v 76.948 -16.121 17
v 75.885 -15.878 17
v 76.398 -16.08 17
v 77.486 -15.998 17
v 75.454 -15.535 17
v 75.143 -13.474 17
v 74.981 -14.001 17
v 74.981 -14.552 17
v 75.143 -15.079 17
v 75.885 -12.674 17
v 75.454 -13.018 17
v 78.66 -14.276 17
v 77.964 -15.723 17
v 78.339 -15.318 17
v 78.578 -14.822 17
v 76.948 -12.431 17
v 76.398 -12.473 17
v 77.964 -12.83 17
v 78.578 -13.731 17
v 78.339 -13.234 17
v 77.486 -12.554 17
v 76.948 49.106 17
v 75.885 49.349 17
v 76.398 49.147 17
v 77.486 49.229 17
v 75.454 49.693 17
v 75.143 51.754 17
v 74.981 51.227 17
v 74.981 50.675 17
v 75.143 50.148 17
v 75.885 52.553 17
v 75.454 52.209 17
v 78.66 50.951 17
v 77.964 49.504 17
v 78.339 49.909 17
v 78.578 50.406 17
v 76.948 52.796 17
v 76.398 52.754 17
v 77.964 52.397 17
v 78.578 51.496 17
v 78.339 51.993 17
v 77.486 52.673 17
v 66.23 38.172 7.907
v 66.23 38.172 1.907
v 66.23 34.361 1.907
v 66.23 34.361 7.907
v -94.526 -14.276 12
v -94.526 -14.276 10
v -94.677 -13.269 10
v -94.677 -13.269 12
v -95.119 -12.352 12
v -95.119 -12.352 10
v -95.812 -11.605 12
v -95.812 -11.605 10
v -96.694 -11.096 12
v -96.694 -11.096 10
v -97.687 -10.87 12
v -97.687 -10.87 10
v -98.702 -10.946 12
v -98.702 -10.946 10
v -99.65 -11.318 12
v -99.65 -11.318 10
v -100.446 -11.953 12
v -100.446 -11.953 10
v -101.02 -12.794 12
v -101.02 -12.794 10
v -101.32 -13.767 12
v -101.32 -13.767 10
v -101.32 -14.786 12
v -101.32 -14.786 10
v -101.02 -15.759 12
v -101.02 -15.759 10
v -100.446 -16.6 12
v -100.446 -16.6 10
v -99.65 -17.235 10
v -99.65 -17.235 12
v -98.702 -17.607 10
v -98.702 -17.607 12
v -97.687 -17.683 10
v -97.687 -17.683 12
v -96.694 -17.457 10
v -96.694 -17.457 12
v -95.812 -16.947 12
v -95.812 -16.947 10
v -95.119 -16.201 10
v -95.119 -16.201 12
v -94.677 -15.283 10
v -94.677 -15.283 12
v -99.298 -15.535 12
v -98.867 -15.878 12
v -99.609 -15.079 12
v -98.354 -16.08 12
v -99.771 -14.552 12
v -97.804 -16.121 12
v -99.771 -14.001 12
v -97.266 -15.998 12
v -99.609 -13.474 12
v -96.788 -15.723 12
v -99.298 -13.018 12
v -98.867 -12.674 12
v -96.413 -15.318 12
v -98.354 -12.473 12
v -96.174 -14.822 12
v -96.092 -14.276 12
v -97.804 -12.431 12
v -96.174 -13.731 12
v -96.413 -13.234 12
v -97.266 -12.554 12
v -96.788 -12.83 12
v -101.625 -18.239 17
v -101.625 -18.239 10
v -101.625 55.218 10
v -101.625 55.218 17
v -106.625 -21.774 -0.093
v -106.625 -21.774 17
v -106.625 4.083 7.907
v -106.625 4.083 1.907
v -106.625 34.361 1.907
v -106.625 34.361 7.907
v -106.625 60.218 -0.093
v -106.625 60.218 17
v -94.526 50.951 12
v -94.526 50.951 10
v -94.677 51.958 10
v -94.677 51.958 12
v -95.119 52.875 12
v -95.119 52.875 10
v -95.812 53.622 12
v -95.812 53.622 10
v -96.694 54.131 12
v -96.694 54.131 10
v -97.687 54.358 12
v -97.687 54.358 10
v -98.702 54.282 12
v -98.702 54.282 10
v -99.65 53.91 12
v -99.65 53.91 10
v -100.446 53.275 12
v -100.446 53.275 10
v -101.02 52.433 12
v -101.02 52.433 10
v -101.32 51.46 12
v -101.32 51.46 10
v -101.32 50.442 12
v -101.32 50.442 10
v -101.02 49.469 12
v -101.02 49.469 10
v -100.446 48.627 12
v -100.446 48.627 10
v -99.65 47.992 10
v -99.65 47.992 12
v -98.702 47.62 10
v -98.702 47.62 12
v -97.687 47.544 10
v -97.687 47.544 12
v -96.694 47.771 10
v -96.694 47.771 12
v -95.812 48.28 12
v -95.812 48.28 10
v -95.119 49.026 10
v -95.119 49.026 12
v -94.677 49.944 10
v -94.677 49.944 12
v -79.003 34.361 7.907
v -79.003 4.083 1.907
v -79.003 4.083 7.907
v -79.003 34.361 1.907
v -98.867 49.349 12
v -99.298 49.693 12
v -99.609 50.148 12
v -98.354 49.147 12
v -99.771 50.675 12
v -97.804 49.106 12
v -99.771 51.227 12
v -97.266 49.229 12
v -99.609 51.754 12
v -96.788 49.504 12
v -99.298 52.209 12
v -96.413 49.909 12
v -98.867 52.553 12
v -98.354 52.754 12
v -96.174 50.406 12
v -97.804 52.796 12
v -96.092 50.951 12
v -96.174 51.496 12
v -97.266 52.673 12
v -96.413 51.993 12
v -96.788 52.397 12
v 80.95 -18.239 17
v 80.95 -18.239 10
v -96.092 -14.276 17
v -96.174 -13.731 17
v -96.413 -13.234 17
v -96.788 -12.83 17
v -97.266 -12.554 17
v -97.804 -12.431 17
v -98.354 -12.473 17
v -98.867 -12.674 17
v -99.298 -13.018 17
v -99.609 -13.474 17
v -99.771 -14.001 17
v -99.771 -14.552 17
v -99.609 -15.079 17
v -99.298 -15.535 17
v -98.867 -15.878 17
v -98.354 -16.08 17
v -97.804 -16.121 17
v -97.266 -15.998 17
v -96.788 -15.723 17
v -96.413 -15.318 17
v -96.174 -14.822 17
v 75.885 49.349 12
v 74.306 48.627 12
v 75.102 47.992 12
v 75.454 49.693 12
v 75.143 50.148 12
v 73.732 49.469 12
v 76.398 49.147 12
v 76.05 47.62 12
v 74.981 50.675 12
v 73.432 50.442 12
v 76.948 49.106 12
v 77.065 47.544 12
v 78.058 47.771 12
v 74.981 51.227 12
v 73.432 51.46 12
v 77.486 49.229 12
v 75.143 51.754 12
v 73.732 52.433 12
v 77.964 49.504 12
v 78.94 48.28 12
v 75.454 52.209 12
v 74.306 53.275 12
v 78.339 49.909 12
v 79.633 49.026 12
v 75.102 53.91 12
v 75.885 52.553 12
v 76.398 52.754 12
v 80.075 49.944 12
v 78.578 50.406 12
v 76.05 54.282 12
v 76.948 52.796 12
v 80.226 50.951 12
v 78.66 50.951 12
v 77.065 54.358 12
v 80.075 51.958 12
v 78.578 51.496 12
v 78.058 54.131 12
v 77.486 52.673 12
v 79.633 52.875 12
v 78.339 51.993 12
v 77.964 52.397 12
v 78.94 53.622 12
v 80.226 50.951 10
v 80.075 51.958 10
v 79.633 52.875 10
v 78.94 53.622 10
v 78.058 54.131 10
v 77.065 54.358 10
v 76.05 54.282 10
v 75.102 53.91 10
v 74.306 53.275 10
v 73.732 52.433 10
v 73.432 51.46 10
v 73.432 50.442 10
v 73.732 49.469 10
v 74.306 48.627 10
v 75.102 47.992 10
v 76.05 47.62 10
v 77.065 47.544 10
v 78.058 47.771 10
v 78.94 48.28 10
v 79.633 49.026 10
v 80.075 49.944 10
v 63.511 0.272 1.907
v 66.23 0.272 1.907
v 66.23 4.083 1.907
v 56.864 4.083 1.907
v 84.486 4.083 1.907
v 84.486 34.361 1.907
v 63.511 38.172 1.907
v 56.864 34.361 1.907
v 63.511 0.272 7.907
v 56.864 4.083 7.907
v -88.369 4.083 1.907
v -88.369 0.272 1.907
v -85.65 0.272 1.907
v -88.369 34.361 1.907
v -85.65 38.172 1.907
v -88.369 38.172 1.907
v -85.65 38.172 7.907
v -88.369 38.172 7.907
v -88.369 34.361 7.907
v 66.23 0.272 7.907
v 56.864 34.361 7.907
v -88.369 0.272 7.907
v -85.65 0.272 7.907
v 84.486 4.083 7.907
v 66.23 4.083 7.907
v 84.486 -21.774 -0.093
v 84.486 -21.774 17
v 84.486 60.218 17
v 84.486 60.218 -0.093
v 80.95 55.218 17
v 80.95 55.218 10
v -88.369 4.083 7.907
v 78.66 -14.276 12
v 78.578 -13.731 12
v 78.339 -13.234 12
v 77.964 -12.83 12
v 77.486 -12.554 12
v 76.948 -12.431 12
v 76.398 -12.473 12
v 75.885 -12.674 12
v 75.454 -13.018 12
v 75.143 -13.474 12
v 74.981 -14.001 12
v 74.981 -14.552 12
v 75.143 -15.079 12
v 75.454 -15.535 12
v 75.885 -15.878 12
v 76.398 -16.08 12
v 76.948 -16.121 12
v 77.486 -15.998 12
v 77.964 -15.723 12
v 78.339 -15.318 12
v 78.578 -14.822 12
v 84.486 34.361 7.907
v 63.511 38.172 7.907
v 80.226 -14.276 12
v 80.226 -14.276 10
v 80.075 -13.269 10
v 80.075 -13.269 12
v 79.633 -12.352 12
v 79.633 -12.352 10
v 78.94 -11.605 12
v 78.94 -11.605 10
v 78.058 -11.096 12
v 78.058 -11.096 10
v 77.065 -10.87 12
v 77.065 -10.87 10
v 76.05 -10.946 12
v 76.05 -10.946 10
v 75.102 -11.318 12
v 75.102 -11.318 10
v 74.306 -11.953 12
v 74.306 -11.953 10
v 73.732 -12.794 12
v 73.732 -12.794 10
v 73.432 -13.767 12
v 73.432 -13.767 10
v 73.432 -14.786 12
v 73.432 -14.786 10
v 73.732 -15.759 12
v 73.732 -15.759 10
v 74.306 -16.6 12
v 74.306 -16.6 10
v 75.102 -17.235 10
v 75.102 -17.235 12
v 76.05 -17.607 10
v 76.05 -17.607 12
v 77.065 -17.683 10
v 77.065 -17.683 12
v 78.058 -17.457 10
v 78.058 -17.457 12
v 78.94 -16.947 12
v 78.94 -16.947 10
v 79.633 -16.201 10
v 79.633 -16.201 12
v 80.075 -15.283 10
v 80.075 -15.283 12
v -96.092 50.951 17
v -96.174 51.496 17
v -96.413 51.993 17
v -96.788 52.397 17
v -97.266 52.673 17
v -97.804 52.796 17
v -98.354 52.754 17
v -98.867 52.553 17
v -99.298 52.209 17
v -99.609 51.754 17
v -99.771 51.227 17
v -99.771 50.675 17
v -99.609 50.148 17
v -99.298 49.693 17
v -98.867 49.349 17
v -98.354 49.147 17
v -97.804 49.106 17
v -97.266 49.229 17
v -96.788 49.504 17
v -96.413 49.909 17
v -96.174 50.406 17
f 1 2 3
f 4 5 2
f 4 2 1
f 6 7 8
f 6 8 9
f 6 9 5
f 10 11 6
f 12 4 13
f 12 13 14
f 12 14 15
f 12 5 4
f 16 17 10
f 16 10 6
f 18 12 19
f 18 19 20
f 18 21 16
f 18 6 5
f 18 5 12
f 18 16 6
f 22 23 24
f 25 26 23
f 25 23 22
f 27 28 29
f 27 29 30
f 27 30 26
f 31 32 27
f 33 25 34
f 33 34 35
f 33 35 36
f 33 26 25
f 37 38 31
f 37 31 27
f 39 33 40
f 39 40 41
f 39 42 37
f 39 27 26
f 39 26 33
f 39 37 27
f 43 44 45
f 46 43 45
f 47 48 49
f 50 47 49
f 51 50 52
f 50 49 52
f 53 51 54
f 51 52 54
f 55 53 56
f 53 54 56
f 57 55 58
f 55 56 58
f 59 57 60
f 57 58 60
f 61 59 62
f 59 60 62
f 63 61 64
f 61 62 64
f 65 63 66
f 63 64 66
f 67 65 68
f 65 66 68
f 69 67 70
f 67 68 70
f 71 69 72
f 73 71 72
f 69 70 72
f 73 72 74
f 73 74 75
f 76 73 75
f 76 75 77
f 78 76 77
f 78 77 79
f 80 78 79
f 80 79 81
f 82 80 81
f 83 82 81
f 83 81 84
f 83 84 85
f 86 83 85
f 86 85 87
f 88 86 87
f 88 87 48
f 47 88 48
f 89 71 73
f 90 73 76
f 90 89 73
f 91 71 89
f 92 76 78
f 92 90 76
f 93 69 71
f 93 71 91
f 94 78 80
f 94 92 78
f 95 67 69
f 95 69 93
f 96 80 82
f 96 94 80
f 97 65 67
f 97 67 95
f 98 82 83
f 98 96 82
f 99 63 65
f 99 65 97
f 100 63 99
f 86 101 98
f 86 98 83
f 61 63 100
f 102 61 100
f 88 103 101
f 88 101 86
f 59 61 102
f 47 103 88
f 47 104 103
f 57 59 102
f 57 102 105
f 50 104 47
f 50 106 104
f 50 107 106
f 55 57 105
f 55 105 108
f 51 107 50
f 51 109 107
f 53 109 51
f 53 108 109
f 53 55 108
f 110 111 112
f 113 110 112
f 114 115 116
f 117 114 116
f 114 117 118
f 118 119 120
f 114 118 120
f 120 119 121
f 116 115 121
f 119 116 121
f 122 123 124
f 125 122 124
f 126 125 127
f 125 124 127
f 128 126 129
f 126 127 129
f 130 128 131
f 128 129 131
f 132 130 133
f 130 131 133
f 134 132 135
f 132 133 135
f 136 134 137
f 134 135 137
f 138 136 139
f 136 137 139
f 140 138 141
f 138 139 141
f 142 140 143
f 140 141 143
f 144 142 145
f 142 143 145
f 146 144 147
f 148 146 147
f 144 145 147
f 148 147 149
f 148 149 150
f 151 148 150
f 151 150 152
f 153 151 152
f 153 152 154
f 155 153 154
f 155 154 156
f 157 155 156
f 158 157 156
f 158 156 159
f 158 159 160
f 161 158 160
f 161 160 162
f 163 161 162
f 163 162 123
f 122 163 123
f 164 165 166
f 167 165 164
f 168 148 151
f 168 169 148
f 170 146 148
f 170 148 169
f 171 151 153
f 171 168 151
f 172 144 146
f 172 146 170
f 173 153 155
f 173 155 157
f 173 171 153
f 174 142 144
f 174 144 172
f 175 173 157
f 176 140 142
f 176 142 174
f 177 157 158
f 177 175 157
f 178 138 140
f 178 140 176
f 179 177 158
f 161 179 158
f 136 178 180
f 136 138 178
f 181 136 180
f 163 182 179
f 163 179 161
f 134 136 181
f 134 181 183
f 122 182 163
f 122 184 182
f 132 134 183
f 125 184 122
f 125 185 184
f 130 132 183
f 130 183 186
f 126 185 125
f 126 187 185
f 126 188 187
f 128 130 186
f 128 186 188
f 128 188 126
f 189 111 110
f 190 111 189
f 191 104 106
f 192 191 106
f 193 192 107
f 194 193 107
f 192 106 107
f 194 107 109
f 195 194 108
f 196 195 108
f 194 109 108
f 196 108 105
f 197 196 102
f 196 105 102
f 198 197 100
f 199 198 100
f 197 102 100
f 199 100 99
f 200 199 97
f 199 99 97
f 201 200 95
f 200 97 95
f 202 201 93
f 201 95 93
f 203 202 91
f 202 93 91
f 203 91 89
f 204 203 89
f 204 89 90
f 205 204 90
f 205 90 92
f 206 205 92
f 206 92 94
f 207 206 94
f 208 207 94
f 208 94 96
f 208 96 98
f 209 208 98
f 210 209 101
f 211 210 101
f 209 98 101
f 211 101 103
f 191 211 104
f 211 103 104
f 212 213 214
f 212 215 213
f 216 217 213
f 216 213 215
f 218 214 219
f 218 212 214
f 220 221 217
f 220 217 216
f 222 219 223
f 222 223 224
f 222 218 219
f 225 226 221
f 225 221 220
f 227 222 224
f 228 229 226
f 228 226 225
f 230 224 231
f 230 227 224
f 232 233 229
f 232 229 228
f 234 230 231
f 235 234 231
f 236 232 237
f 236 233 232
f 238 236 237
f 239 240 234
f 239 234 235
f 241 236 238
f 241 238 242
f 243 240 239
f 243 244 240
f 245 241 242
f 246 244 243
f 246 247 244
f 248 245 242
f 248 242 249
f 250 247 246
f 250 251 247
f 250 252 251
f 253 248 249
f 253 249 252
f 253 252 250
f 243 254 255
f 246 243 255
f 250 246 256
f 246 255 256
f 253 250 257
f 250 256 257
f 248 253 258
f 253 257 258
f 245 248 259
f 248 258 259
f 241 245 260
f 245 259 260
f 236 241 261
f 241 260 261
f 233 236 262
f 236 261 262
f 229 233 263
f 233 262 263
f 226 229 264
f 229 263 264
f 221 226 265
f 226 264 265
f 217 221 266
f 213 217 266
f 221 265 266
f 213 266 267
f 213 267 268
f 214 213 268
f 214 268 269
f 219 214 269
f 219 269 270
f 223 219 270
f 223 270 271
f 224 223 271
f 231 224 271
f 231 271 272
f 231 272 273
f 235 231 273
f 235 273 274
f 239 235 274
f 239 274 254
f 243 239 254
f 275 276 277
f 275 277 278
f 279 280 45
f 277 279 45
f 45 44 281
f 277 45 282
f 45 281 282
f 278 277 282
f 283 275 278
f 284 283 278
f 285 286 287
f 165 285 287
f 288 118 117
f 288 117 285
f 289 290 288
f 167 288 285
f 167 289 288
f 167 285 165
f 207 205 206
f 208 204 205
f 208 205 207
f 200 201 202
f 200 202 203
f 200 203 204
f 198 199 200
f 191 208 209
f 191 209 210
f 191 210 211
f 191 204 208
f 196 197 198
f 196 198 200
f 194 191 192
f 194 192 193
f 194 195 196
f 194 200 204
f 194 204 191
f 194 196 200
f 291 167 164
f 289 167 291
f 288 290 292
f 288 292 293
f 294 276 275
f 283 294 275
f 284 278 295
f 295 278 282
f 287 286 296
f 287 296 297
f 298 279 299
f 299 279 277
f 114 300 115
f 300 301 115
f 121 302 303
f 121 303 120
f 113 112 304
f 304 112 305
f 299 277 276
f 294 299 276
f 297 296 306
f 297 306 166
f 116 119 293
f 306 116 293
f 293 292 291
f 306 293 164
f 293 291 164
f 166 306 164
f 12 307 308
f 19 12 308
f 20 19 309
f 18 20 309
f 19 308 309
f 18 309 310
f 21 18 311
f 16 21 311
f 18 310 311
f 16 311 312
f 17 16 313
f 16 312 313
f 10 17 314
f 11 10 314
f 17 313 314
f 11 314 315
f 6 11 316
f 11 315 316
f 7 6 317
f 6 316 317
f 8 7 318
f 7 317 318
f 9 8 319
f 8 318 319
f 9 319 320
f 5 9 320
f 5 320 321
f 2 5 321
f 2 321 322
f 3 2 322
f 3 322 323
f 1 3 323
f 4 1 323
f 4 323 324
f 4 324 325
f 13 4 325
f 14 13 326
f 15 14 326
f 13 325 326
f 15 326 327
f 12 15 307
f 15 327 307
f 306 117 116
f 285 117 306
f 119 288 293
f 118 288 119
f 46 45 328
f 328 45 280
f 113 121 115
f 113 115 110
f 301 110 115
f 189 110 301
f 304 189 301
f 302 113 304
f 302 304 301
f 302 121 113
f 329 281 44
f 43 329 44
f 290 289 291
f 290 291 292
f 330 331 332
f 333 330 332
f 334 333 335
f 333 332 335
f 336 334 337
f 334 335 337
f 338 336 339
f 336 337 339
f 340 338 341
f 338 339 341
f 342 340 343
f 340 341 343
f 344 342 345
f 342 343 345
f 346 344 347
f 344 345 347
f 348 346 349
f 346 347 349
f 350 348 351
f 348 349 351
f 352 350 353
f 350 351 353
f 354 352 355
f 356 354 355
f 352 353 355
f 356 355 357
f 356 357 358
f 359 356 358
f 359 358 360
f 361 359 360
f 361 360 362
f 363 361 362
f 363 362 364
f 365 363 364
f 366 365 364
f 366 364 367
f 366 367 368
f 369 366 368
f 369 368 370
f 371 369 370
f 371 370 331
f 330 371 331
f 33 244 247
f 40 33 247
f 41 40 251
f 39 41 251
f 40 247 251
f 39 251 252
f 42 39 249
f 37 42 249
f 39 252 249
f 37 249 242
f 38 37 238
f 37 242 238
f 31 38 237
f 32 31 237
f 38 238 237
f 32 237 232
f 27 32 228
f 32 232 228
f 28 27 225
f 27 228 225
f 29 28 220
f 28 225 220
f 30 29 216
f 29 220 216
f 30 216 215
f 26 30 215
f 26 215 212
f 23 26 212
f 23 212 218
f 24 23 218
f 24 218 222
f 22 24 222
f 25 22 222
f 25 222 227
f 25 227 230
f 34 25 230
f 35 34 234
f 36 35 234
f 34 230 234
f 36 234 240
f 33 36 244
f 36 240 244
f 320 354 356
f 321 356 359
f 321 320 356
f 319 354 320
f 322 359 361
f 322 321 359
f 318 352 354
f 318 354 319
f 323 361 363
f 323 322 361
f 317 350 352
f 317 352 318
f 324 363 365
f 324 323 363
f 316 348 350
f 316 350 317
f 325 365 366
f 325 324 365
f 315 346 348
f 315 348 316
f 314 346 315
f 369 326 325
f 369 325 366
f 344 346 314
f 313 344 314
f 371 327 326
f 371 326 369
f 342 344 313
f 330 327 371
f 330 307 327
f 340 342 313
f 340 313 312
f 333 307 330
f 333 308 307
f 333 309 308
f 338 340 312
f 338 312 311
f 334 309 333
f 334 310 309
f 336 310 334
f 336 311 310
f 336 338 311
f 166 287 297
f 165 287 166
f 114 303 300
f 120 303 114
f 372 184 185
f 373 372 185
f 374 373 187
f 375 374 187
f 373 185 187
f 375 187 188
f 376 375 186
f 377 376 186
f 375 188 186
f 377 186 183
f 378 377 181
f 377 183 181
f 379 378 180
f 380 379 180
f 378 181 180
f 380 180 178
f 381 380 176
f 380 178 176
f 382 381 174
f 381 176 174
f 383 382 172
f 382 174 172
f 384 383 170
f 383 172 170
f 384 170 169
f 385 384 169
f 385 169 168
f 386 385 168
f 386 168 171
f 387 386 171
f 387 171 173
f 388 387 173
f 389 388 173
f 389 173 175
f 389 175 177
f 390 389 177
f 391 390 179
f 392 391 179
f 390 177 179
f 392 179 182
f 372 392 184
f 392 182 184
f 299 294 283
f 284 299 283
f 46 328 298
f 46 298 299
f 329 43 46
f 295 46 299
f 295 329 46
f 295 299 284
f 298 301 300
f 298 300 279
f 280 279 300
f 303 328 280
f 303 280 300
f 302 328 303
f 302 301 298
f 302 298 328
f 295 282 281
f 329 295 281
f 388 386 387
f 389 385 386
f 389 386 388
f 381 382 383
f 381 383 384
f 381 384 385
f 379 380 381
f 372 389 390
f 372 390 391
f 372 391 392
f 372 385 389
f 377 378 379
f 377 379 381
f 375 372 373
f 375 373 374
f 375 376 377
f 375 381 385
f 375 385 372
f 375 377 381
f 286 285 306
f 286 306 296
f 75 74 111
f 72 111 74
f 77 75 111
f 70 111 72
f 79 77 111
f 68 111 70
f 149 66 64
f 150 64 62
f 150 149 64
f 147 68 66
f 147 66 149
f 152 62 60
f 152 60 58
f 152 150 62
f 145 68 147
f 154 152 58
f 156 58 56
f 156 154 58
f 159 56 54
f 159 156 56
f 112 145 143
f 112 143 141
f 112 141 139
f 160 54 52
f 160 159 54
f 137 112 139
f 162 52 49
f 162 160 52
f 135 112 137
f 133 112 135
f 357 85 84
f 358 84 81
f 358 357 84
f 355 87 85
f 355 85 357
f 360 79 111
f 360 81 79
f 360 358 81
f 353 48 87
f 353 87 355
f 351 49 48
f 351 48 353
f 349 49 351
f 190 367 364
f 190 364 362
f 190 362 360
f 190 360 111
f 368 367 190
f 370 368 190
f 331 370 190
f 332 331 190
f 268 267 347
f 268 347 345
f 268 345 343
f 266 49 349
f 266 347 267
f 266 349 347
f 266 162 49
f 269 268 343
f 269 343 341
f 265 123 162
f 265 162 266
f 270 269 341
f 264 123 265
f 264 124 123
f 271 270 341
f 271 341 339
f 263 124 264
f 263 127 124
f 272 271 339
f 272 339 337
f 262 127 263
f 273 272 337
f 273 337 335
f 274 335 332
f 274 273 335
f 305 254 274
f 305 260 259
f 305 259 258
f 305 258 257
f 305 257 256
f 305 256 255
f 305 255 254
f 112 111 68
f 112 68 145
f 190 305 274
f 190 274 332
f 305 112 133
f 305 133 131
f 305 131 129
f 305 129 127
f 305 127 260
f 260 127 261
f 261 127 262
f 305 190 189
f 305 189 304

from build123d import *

# Parameters (mm, degrees)
BOSS_EXTRUDE1_DEPTH      = 5
BOSS_EXTRUDE1_DEPTH_BACK = 0.093151617
SKETCH1_W                = 182.5752
SKETCH1_H                = 73.4568
SKETCH2_R                = 3.416363386
BOSS_EXTRUDE2_DEPTH      = 7
SKETCH3_R                = 1.85
BOSS_EXTRUDE3_DEPTH      = 5
SKETCH4_W                = 191.110733906
SKETCH4_H                = 81.992333906
SKETCH4_W_2              = 182.5752
SKETCH4_H_2              = 73.4568
BOSS_EXTRUDE4_DEPTH      = 12
SKETCH5_W                = 191.110733906
SKETCH5_H                = 81.992333906
BOSS_EXTRUDE5_DEPTH      = 5.093151617
SKETCH7_W                = 182.5752
SKETCH7_H                = 73.4568
BOSS_EXTRUDE7_DEPTH      = 5
CUT_EXTRUDE1_START       = -2
CUT_EXTRUDE1_DEPTH       = 6


with BuildPart() as part:
    # Sketch1 → Boss-Extrude1 (new, two sides: drawn at the far end of the back side and taken through both)
    with BuildSketch(Plane.XY.offset(-BOSS_EXTRUDE1_DEPTH_BACK)):
        with Locations((-10.337299282, 18.489677755)):
            Rectangle(SKETCH1_W, SKETCH1_H)
    extrude(amount=BOSS_EXTRUDE1_DEPTH + BOSS_EXTRUDE1_DEPTH_BACK)

    # Sketch2 → Boss-Extrude2 (add)
    with BuildSketch(Plane.XY.offset(5)):
        with Locations((-97.941899282, 50.950877755)):
            Circle(SKETCH2_R)
        with Locations((76.810100718, 50.950877755)):
            Circle(SKETCH2_R)
        with Locations((76.810100718, -14.276322245)):
            Circle(SKETCH2_R)
        with Locations((-97.941899282, -14.276322245)):
            Circle(SKETCH2_R)
    extrude(amount=BOSS_EXTRUDE2_DEPTH)

    # Sketch3 → Boss-Extrude3 (add)
    with BuildSketch(Plane.XY.offset(12)):
        with Locations((-97.941899282, 50.950877755)):
            Circle(SKETCH3_R)
        with Locations((-97.941899282, -14.276322245)):
            Circle(SKETCH3_R)
        with Locations((76.810100718, -14.276322245)):
            Circle(SKETCH3_R)
        with Locations((76.810100718, 50.950877755)):
            Circle(SKETCH3_R)
    extrude(amount=BOSS_EXTRUDE3_DEPTH)



with BuildPart() as body_2:
    # Sketch4 → Boss-Extrude4 (new body)
    with BuildSketch(Plane.XY.offset(5)):
        with Locations((-11.069532329, 19.221910802)):
            Rectangle(SKETCH4_W, SKETCH4_H)
        with Locations((-10.337299282, 18.489677755)):
            Rectangle(SKETCH4_W_2, SKETCH4_H_2, mode=Mode.SUBTRACT)
    extrude(amount=BOSS_EXTRUDE4_DEPTH)


with BuildPart() as part_1:
    add(part.part)

    add(body_2.part)  # Boss-Extrude5 merges body 2
    # Sketch5 → Boss-Extrude5 (add)
    with BuildSketch(Plane(origin=(0, 0, 5), x_dir=(-1, 0, 0), z_dir=(0, 0, -1))):
        with Locations((11.069532329, 19.221910802)):
            Rectangle(SKETCH5_W, SKETCH5_H)
    extrude(amount=BOSS_EXTRUDE5_DEPTH)

    # Sketch7 → Boss-Extrude7 (add)
    with BuildSketch(Plane.XY.offset(5)):
        with Locations((-10.337299282, 18.489677755)):
            Rectangle(SKETCH7_W, SKETCH7_H)
    extrude(amount=BOSS_EXTRUDE7_DEPTH)

    # Sketch6 → Cut-Extrude1 (cut)
    with BuildSketch(Plane(origin=(0, 0, -0.093151617), x_dir=(-1, 0, 0), z_dir=(0, 0, -1)).offset(CUT_EXTRUDE1_START)):
        Polygon((-84.485834624, 34.360708249), (-84.485834624, 4.083113354), (-66.229962778, 4.083113354), (-66.229962778, 0.271521895), (-63.510633591, 0.271521895), (-56.864299396, 4.083113354), (-56.864299396, 34.360708249), (-63.510633591, 38.172299708), (-66.229962778, 38.172299708), (-66.229962778, 34.360708249), align=None)
    cut_extrude1 = extrude(amount=-CUT_EXTRUDE1_DEPTH, mode=Mode.SUBTRACT)

    # Mirror1: Cut-Extrude1 across plane
    add(cut_extrude1.mirror(Plane(origin=(-11.069532329, 0, 0), x_dir=(0, 0, 1), z_dir=(1, 0, 0))), mode=Mode.SUBTRACT)


solid = part_1.part
